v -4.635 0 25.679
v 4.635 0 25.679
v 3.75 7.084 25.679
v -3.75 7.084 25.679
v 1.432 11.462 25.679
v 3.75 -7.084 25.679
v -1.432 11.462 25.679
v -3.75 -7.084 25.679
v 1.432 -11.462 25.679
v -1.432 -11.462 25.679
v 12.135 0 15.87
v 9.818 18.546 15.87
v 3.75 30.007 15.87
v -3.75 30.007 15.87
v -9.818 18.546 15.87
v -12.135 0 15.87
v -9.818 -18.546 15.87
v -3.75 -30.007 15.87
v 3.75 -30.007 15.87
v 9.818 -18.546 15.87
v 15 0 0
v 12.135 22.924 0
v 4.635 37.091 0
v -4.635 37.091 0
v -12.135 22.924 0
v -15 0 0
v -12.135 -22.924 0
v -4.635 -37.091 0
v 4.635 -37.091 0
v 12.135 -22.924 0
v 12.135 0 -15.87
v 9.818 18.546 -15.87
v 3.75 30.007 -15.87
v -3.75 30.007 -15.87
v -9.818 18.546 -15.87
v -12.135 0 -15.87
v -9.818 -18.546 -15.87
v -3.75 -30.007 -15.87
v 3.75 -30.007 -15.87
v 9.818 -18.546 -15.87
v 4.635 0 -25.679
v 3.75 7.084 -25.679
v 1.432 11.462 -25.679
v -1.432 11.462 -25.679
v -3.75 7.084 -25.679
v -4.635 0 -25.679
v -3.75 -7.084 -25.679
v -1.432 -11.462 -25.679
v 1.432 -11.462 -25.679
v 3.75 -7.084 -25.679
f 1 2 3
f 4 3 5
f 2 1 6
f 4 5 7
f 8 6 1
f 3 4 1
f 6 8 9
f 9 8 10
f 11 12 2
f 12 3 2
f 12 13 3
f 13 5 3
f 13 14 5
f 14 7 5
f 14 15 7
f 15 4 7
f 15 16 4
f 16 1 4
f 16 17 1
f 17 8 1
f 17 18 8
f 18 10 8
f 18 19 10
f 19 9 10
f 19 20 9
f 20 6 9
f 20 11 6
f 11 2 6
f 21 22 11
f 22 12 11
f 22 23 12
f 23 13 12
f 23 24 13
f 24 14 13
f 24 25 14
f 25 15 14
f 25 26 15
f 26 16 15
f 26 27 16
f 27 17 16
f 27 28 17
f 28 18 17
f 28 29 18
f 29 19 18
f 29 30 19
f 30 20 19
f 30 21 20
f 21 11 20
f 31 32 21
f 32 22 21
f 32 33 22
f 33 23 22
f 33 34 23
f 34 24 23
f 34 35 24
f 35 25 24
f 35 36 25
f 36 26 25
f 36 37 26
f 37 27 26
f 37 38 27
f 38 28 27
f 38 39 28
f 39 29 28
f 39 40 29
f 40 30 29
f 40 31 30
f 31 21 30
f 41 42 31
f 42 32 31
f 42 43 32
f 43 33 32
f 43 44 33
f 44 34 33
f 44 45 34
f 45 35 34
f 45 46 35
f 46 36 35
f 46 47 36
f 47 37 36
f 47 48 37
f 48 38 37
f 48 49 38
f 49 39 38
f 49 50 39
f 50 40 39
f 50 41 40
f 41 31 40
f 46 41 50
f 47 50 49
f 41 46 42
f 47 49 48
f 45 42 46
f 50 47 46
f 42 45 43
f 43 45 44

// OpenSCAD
// Generated by SolidPython 1.0.1 on 2020-07-29 00:46:46


scale(v = [5, 13, 9]) {
	sphere(r = 3);
}
/***********************************************
*********      SolidPython code:      **********
************************************************
 
# import packages: SolidPython
from solid import *
from solid.utils import *
from itertools import chain, combinations, permutations


class Resize:

    def __init__(self, scad_file):
        self.scad_file = scad_file
        #self.scad_file = import_scad(scad_file)
        # cone/cylinder param:
        self.r1 = 0
        self.r2 = 0
        self.h = 0
        # rectangular prism param:
        self.w = 0
        self.l = 0
        # ellipse param:
        self.r = 0

    # import OpenScad code (file name corresponds to shape)


    # classify shape + parameters
    def assign(self, param1, param2, param3):
        if self.scad_file == 'cone.scad':
            self.r1 = param1
            self.r2 = param2
            self.h = param3
        elif self.scad_file == 'cylinder.scad':
            self.r1 = param1
            self.r2 = param2
            self.h = param3
        elif self.scad_file == 'rectangularPrism.scad':
            self.h = param1
            self.l = param2
            self.w = param3
        else:
            self.r = param1
            self.h = param2

    # resize parameters
    def iterate(self):
        x = range(3, 20, 2)
        i = 1
        if self.scad_file == 'cone.scad':
            tempList = list(permutations(x, 2))
            for temp in tempList:
                param1 = temp[0]
                param2 = temp[1]
                filepath = 'produced_scad_files/' + 'cone' + str(param1) + '_' + str(param2) + '_' + '.scad'
                scad_render_to_file(cylinder(h=param1, r1=param2, r2=0), filepath)

        elif self.scad_file == 'cylinder.scad':
            tempList = list(permutations(x, 3))
            for temp in tempList:
                param1 = temp[0]
                param2 = temp[1]
                filepath = 'produced_scad_files/' + 'cylinder' + str(param1) + '_' + str(param2) + '_' + '.scad'
                scad_render_to_file(cylinder(h=param1, r1=param2, r2=param2), filepath)

        elif self.scad_file == 'rectangularPrism.scad':
            tempList = list(permutations(x, 3))
            for temp in tempList:
                param1 = temp[0]
                param2 = temp[1]
                param3 = temp[2]
                filepath = 'produced_scad_files/' + 'rectangularPrism' + str(param1) + '_' + str(param2) + '_' + str(
                    param3) + '.scad'
                scad_render_to_file(cube(size=(param1, param2, param3)), filepath)

        elif self.scad_file == 'ellipse.scad':
            tempList = list(permutations(x, 4))
            for temp in tempList:
                param1 = temp[0]
                param2 = temp[1]
                param3 = temp[2]
                param4 = temp[3]
                filepath = 'produced_scad_files/' + 'ellipse' + str(param1) + '_' + str(param2) + '_' + str(param3) + '_' + str(param4) + '.scad'
                scad_render_to_file(scale([param1, param2, param3])(sphere(r=param4)), filepath)

    def render_to_scadfile(self):
        scad_render_to_file(scad, 'example.scad') 
 
************************************************/
